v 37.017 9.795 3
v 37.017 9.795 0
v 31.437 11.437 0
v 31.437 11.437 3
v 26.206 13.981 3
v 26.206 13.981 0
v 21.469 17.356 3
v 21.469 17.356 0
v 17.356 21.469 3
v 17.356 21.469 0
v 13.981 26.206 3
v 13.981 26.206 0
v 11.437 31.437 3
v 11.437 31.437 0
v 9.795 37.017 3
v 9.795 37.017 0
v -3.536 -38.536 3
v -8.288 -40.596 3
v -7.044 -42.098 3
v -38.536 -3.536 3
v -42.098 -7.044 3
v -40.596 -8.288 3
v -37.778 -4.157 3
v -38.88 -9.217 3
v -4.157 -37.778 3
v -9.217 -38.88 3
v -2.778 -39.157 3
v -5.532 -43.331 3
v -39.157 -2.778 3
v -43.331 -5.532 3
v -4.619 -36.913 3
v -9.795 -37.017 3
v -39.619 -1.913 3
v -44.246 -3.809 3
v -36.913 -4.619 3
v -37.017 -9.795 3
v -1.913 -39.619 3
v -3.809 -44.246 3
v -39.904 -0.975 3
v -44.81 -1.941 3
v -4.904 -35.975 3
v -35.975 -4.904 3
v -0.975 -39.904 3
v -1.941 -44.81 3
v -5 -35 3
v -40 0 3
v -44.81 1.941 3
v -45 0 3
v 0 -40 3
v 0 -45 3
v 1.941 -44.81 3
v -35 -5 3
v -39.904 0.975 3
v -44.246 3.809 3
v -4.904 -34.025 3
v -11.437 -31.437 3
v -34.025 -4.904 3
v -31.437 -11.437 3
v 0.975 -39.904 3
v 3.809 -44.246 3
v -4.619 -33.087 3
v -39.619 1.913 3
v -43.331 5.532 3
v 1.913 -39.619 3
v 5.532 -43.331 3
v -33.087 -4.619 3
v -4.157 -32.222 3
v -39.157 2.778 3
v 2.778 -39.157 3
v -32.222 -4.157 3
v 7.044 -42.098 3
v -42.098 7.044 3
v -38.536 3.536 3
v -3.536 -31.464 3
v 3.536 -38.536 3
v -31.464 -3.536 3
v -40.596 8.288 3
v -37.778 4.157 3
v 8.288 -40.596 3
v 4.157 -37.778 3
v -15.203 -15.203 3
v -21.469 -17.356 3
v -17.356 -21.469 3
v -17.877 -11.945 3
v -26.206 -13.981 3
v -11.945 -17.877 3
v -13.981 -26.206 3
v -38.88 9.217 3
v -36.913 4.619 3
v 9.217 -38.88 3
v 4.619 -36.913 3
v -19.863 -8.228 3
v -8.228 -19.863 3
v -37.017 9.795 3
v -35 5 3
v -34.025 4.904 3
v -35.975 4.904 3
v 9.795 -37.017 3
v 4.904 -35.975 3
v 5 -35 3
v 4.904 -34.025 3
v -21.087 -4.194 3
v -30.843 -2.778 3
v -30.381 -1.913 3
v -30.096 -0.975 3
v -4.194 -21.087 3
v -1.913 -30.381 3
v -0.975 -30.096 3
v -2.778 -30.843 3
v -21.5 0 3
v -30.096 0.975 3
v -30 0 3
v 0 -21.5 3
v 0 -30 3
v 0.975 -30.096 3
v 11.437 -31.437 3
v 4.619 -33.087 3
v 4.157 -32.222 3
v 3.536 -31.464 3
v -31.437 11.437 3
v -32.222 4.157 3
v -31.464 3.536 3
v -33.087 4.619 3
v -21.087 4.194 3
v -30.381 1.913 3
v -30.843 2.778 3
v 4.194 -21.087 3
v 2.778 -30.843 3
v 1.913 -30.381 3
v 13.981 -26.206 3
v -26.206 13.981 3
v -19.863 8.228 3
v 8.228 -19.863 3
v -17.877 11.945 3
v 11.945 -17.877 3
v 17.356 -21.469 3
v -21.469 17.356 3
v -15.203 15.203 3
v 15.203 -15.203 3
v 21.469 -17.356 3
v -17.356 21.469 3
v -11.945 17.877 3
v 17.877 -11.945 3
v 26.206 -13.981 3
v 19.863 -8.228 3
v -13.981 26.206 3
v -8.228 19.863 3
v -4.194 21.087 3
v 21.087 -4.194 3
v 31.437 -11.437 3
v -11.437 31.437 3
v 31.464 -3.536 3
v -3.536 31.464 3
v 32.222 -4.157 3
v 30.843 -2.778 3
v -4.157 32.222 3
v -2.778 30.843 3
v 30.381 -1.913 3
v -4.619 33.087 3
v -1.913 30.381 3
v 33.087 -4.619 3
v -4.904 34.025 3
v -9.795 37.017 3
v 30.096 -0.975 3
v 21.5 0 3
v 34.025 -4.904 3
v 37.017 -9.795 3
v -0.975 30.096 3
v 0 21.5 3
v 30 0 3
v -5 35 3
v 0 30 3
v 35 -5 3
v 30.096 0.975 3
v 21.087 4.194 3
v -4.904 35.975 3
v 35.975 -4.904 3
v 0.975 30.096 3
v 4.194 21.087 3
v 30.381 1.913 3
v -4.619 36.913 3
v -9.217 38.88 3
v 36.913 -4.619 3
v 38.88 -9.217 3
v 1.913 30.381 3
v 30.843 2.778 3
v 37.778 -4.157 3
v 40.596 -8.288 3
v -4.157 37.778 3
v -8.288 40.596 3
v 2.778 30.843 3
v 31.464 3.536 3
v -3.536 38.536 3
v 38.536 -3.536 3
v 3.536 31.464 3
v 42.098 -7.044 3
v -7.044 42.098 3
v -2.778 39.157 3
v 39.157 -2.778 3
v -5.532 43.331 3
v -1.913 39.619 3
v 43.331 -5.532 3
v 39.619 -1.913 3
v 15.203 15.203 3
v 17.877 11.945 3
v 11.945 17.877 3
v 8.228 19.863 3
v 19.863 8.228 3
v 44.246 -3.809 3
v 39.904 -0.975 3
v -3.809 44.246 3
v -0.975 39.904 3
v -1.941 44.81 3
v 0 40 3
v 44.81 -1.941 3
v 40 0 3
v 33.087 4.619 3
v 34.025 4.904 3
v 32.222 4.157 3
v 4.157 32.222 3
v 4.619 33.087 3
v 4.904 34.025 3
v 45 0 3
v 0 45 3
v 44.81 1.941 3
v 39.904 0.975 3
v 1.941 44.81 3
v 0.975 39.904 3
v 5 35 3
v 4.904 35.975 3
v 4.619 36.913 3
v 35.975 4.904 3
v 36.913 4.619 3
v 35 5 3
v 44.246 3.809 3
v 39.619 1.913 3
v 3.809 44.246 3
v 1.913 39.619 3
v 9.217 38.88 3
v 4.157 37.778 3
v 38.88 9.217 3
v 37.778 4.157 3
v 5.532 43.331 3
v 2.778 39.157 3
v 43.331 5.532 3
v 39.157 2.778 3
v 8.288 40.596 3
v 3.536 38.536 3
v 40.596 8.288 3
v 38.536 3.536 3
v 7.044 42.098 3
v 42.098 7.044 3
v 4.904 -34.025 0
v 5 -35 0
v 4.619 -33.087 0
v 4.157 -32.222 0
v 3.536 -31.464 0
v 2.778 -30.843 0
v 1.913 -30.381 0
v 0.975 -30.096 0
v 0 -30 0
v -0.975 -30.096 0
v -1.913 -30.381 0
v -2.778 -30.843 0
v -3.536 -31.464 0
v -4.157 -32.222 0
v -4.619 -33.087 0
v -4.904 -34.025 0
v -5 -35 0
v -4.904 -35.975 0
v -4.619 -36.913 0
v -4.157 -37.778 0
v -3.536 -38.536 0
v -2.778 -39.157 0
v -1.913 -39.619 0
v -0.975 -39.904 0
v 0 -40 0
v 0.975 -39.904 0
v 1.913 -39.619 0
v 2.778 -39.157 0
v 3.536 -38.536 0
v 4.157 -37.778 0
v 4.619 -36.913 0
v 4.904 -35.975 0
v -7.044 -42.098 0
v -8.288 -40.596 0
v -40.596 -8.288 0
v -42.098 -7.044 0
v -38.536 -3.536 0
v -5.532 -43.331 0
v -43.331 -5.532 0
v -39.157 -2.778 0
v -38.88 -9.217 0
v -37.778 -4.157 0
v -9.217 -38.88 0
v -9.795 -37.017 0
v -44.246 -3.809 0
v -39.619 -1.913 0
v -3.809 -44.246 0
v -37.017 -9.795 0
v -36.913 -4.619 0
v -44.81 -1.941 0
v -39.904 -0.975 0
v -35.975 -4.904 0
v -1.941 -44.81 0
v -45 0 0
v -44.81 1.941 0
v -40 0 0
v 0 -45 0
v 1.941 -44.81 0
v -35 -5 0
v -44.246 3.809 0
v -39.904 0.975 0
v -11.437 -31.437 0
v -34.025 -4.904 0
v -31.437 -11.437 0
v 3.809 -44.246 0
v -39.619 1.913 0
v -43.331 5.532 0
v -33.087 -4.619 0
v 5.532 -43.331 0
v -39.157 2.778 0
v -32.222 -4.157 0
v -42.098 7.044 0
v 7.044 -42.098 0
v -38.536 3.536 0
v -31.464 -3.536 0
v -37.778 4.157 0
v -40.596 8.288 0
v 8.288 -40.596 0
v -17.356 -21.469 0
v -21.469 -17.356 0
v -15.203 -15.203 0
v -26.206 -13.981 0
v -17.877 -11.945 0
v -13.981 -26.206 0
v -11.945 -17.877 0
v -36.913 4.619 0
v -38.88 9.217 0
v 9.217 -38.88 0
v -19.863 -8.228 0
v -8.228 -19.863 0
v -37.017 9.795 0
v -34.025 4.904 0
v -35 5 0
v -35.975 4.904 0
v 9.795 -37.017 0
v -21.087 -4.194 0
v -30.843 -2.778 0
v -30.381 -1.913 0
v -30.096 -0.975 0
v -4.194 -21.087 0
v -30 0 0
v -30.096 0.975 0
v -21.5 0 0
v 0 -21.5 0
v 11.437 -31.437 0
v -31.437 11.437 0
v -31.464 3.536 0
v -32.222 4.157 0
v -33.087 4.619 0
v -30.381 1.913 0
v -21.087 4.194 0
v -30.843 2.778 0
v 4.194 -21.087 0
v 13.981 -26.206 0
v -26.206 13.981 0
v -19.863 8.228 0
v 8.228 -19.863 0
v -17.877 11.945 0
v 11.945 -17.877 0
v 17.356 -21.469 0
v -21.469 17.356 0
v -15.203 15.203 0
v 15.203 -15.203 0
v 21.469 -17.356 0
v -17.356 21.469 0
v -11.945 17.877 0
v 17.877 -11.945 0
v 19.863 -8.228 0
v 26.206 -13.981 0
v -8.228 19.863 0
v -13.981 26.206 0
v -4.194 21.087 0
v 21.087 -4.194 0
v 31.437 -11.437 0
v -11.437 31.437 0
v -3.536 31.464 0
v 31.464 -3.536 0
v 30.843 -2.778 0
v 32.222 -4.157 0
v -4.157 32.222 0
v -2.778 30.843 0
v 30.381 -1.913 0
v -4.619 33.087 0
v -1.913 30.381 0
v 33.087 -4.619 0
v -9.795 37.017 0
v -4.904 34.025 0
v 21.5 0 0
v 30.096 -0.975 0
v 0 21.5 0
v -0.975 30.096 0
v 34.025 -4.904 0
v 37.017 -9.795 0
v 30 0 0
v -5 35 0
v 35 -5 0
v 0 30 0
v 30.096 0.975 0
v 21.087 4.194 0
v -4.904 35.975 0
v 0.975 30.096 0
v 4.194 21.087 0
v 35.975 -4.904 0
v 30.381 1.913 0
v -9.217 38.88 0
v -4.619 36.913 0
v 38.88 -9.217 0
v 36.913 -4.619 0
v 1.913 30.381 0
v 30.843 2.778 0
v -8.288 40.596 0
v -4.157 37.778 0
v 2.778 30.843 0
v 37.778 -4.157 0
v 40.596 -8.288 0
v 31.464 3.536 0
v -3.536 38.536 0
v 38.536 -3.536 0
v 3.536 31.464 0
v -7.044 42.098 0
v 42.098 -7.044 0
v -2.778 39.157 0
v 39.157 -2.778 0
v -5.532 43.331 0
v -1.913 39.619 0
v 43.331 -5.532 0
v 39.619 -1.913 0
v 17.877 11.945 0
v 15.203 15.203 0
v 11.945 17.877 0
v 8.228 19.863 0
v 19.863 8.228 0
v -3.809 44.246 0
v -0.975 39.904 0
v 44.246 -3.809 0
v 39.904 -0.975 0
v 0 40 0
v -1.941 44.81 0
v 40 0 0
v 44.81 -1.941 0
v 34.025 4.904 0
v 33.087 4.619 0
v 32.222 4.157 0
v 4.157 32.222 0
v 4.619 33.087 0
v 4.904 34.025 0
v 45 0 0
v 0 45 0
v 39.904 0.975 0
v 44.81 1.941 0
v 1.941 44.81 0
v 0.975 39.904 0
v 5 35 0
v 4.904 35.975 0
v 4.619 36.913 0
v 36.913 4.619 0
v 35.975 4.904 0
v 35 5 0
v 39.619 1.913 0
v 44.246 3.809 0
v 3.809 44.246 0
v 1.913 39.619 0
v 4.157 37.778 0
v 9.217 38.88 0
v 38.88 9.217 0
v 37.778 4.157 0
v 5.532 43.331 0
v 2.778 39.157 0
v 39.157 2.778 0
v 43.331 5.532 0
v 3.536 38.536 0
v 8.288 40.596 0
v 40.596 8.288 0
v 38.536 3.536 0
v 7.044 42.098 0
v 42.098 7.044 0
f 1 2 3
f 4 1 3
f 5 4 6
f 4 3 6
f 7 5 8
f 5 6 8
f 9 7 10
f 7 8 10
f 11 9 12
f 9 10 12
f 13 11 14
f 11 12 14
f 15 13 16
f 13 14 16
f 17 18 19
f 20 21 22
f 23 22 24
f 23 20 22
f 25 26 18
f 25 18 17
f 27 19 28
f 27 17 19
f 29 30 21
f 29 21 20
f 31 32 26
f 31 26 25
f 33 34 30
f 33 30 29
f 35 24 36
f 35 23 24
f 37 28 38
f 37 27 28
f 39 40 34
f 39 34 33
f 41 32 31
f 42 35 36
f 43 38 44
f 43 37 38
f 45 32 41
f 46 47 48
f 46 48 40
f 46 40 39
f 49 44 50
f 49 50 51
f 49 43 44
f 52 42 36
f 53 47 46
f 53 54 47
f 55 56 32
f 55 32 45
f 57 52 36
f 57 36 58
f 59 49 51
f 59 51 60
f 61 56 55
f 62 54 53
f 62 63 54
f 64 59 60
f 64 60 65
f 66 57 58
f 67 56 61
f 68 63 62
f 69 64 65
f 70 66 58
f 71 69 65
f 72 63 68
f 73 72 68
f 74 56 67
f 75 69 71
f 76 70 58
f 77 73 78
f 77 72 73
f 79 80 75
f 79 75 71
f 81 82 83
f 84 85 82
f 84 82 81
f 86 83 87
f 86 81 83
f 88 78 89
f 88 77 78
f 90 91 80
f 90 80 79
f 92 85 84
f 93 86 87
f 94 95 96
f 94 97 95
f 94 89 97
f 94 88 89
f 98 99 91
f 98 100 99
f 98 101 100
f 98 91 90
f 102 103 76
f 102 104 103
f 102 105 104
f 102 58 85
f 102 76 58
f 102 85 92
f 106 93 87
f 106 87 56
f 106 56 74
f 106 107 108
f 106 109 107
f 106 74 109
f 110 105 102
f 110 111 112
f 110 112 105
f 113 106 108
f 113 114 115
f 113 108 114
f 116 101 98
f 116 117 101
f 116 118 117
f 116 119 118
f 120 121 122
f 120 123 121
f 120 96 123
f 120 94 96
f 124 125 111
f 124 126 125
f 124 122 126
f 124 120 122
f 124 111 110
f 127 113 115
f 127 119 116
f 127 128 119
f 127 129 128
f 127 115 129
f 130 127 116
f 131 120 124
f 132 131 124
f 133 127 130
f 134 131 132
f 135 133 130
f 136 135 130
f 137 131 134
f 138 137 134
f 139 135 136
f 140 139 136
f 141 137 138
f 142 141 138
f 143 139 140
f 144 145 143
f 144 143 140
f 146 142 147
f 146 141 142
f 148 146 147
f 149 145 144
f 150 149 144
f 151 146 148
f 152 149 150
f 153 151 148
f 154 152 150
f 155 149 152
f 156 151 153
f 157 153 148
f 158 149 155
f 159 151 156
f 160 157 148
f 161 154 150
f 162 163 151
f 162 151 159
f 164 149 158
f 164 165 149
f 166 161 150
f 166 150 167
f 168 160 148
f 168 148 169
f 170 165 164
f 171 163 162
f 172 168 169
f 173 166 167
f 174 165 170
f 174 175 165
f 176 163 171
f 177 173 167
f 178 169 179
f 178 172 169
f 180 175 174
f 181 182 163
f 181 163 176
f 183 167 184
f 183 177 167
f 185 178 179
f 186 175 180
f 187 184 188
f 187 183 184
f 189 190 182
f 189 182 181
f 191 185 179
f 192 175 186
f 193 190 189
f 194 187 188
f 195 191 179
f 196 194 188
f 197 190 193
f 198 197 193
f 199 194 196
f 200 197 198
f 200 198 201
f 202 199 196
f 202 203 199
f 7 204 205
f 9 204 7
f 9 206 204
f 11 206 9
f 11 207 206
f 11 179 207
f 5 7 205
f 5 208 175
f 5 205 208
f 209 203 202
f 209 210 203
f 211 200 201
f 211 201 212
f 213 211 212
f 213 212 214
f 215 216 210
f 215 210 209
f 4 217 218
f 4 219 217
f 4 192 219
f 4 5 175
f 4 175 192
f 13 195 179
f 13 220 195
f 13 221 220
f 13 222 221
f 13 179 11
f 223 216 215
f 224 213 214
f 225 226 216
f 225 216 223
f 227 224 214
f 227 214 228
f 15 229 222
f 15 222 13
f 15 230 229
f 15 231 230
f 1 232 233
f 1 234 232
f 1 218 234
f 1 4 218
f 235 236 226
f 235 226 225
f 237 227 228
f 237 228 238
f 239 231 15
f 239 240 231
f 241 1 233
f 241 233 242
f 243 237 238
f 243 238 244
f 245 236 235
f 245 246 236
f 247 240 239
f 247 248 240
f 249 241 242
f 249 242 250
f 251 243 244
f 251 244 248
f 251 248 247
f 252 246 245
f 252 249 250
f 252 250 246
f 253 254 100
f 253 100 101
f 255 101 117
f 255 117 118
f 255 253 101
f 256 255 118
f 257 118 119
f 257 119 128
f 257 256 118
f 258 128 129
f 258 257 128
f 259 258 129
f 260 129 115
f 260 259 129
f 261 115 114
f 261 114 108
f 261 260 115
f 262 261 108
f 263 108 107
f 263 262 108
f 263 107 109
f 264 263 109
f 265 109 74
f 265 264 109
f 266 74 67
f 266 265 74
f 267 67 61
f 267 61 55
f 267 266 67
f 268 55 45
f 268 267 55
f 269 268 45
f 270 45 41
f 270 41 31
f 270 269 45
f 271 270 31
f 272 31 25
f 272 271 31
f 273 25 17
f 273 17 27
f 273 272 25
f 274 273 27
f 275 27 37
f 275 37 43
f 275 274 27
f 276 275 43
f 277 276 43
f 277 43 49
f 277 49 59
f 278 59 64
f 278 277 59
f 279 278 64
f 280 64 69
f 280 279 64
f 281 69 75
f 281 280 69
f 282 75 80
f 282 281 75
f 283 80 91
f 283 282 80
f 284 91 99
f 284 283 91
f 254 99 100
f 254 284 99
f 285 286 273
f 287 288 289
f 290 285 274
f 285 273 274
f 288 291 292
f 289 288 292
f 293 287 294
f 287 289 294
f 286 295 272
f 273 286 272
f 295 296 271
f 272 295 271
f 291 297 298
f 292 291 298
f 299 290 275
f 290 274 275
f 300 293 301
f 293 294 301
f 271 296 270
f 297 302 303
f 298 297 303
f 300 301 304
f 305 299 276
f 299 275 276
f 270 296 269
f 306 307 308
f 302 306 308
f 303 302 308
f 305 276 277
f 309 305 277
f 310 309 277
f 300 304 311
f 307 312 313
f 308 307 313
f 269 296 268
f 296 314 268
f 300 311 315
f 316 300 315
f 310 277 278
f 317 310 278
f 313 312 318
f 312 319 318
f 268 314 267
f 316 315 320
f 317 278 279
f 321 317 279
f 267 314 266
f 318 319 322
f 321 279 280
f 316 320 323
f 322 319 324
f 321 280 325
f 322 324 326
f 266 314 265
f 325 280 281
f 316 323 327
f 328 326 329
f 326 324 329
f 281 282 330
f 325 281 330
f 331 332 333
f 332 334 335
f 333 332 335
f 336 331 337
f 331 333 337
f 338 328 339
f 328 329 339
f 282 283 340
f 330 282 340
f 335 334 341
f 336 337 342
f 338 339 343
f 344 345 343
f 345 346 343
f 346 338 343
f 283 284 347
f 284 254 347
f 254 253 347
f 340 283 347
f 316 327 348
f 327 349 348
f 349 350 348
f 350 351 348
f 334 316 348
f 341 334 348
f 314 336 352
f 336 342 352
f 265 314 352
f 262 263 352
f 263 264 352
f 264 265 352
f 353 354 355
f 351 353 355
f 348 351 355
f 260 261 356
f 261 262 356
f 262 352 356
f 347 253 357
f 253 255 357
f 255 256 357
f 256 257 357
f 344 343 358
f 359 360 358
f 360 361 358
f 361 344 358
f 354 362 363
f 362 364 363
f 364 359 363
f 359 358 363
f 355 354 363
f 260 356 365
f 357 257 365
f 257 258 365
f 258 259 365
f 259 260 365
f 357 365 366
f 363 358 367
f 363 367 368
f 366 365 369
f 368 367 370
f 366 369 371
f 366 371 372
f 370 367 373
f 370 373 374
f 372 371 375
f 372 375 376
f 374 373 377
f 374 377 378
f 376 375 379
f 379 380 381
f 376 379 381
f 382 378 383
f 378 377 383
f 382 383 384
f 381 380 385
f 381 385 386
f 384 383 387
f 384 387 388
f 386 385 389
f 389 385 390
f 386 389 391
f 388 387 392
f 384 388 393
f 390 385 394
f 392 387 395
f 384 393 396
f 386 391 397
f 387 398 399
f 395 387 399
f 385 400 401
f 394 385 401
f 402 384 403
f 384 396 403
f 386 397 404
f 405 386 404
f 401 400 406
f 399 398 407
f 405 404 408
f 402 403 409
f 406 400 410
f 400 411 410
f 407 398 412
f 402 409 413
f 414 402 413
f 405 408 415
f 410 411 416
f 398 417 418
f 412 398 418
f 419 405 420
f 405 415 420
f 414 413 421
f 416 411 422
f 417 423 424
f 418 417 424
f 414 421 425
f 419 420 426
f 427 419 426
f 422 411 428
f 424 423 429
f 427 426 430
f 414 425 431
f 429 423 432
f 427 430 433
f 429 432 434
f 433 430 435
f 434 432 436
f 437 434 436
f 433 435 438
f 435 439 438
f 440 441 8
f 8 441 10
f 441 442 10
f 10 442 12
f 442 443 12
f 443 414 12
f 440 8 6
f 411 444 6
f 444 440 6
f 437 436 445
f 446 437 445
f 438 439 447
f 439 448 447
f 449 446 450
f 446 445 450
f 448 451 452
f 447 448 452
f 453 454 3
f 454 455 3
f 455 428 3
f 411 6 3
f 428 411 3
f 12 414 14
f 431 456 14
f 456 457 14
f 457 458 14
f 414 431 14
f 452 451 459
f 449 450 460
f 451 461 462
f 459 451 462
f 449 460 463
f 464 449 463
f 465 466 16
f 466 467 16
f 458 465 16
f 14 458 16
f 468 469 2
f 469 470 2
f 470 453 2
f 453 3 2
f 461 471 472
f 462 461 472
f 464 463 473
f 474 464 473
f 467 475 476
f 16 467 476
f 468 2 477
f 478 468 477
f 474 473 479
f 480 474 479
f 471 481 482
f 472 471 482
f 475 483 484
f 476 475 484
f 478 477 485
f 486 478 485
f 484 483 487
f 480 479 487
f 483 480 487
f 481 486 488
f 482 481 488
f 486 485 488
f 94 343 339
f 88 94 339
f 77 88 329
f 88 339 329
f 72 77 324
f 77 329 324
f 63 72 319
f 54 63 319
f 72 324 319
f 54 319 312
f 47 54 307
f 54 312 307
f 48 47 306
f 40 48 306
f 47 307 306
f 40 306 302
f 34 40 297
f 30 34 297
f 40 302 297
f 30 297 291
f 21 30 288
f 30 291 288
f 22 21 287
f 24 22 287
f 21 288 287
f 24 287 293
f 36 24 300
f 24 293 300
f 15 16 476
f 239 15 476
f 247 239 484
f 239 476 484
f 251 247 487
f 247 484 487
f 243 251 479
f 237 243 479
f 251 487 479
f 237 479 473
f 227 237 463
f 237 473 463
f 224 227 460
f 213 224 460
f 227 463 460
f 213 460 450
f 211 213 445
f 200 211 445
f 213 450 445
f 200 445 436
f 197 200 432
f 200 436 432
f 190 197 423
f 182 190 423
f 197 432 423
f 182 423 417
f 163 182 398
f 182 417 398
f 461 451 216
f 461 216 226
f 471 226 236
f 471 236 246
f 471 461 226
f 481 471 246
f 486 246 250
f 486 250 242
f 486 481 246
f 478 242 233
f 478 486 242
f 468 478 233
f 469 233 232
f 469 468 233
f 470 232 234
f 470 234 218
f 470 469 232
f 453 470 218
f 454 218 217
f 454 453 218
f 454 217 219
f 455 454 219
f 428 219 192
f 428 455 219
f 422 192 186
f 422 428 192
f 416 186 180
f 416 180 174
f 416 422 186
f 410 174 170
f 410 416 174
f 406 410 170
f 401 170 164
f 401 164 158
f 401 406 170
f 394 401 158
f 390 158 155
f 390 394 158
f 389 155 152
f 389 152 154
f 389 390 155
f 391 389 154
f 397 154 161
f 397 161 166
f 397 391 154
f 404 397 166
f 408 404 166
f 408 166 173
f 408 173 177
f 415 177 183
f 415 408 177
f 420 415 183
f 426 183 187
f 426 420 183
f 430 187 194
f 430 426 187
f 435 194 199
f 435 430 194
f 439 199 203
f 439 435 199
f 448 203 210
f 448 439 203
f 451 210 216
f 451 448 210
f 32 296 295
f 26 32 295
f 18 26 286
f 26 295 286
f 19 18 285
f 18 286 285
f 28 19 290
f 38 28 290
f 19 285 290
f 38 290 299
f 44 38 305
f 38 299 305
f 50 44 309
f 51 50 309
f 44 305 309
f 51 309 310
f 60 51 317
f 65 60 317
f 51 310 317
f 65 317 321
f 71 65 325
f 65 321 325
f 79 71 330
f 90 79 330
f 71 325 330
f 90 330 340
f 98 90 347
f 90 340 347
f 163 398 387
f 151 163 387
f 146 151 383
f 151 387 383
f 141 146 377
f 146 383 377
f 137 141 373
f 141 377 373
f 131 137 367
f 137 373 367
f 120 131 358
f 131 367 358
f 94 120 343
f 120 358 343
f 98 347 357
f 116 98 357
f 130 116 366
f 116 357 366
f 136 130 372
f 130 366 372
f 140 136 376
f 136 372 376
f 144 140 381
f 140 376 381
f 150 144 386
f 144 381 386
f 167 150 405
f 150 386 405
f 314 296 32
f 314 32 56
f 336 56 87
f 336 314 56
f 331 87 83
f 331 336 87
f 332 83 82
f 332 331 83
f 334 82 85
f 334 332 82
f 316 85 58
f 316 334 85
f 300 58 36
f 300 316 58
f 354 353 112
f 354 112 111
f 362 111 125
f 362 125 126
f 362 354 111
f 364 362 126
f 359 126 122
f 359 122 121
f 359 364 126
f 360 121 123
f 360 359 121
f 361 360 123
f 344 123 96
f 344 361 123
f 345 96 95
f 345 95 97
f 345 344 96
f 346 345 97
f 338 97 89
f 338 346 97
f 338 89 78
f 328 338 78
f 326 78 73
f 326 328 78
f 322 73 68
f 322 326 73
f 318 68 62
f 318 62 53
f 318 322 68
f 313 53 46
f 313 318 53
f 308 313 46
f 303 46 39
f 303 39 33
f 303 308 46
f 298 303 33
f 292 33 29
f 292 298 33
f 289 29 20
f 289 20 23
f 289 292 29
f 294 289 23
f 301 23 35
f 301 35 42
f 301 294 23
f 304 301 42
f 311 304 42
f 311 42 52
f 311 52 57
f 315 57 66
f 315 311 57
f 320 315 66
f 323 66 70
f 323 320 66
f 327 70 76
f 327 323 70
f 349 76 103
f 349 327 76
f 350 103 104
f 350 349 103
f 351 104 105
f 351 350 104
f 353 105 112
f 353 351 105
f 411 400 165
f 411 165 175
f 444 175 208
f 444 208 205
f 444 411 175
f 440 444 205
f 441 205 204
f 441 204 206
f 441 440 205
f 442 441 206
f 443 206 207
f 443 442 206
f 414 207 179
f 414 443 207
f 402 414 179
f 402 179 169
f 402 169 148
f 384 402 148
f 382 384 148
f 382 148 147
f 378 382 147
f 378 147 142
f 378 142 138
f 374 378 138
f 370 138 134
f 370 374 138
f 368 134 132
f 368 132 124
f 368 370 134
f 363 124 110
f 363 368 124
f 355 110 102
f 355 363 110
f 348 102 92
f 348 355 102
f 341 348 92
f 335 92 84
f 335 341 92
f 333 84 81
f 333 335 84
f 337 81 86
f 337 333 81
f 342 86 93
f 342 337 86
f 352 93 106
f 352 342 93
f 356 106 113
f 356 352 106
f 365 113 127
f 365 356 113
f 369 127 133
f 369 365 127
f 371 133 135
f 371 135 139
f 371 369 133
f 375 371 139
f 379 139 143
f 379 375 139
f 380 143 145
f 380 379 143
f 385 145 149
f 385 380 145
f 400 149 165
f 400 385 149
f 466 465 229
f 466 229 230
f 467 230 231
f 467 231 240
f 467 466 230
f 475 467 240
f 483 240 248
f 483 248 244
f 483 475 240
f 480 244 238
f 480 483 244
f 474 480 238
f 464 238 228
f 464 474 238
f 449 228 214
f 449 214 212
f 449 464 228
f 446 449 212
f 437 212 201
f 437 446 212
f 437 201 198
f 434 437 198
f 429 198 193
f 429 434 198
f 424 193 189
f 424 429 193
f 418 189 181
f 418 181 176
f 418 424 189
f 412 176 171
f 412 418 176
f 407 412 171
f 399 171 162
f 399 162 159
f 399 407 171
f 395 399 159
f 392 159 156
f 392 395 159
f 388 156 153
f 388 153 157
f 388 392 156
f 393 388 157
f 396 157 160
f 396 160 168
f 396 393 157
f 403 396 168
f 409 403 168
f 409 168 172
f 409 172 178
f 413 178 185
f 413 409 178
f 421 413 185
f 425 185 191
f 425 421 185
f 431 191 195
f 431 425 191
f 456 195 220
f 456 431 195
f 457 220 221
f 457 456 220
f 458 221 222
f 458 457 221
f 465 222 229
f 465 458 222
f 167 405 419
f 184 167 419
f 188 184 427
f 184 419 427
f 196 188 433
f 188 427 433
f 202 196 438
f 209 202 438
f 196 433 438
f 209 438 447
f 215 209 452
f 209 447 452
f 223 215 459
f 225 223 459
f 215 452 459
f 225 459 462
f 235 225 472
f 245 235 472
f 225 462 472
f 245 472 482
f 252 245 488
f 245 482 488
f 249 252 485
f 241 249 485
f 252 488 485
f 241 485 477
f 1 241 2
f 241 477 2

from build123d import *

# Parameters (mm, degrees)
SZKIC1_R                    = 5
SZKIC1_R_2                  = 21.5
DODANIE_WYCI_GNI_CIE1_DEPTH = 3
DODANIE_WYCI_GNI_CIE2_DEPTH = 3


with BuildPart() as part:
    # Szkic1 → Dodanie-wyciągnięcie1 (new body)
    with BuildSketch(Plane.XY):
        with BuildLine():
            ThreePointArc((10, 35), (0, 45), (-10, 35))
            ThreePointArc((-10, 35), (-17.32233047, 17.32233047), (-35, 10))
            ThreePointArc((-35, 10), (-45, 0), (-35, -10))
            ThreePointArc((-35, -10), (-17.32233047, -17.32233047), (-10, -35))
            ThreePointArc((-10, -35), (0, -45), (10, -35))
            ThreePointArc((10, -35), (17.32233047, -17.32233047), (35, -10))
            ThreePointArc((35, -10), (45, 0), (35, 10))
            ThreePointArc((35, 10), (17.32233047, 17.32233047), (10, 35))
        make_face()
        with Locations((0, 35)):
            Circle(SZKIC1_R, mode=Mode.SUBTRACT)
        Circle(SZKIC1_R_2, mode=Mode.SUBTRACT)
        with Locations((35, 0)):
            Circle(SZKIC1_R, mode=Mode.SUBTRACT)
        with Locations((0, -35)):
            Circle(SZKIC1_R, mode=Mode.SUBTRACT)
        with Locations((-35, 0)):
            Circle(SZKIC1_R, mode=Mode.SUBTRACT)
    extrude(amount=DODANIE_WYCI_GNI_CIE1_DEPTH)

    # Szkic2 → Dodanie-wyciągnięcie2 (add)
    with BuildSketch(Plane.XY):
        with BuildLine():
            Line((27.599747415, 5.722247038), (37.016747674, 9.794525452))
            ThreePointArc((37.016747674, 9.794525452), (19.32662719, 19.32662719), (9.794525452, 37.016747674))
            Line((9.794525452, 37.016747674), (8.161162093, 24.785340239))
            Line((8.161162093, 24.785340239), (27.599747415, 5.722247038))
        make_face()
        with BuildLine():
            Line((-5.468778256, 25.979107706), (-9.794525452, 37.016747674))
            ThreePointArc((-9.794525452, 37.016747674), (-19.32662719, 19.32662719), (-37.016747674, 9.794525452))
            Line((-37.016747674, 9.794525452), (-28.775607604, 5.722247038))
            Line((-28.775607604, 5.722247038), (-5.468778256, 25.979107706))
        make_face()
        with BuildLine():
            ThreePointArc((-9.794525452, -37.016747674), (-19.32662719, -19.32662719), (-37.016747674, -9.794525452))
            Line((-37.016747674, -9.794525452), (-27.727906649, -4.880240326))
            Line((-27.727906649, -4.880240326), (-6.103941432, -26.086498779))
            Line((-6.103941432, -26.086498779), (-9.794525452, -37.016747674))
        make_face()
        with BuildLine():
            ThreePointArc((9.794525452, -37.016747674), (19.32662719, -19.32662719), (37.016747674, -9.794525452))
            Line((37.016747674, -9.794525452), (25.012487301, -7.237711123))
            Line((25.012487301, -7.237711123), (6.527798735, -26.086498779))
            Line((6.527798735, -26.086498779), (9.794525452, -37.016747674))
        make_face()
    extrude(amount=DODANIE_WYCI_GNI_CIE2_DEPTH)


solid = part.part
